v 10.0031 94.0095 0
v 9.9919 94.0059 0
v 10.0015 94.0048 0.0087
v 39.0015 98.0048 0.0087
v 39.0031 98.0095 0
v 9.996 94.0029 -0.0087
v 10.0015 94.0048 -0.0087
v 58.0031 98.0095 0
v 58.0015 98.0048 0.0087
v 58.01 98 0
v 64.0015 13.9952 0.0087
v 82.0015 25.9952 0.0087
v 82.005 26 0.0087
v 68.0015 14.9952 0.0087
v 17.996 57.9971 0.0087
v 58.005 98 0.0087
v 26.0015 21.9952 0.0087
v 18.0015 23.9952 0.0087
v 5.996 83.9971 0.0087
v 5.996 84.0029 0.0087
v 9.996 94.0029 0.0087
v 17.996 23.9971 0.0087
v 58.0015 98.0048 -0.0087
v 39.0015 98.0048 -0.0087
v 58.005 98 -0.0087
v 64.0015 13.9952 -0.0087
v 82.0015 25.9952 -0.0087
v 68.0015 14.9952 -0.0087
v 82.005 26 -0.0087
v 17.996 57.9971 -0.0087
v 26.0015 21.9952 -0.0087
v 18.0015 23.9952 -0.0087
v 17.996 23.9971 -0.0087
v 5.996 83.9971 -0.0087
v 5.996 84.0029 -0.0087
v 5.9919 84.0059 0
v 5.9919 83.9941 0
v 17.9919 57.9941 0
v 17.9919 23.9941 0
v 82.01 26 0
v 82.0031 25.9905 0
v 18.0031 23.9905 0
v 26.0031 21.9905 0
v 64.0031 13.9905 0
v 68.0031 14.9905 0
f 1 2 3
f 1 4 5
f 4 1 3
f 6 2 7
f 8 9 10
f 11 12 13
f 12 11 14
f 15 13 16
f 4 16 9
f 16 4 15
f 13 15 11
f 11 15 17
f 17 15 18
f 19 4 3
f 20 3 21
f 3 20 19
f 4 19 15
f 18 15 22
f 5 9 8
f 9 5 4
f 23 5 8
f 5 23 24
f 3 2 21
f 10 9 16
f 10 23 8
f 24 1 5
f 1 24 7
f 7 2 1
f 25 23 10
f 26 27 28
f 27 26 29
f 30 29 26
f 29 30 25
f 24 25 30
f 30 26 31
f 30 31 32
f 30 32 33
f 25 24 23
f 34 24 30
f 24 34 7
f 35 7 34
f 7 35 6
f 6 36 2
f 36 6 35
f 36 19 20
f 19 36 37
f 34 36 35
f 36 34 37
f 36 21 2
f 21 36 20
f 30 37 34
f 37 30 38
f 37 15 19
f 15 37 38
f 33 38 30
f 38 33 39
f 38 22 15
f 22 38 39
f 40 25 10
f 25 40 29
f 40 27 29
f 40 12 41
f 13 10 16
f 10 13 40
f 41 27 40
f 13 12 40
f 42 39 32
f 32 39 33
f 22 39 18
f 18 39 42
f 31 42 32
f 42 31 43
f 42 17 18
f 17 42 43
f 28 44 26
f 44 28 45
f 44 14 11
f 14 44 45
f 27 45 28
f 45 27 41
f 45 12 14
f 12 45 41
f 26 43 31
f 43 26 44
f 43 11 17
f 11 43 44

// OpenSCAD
color([0.013948469234104865,0.8018456354370093,0.2607079205191076]) hull(){
    translate([10,94]) sphere(0.01);
    translate([39,98]) sphere(0.01);
    translate([58,98]) sphere(0.01);
}
color([0.01899716010339858,0.7507132946374245,0.44168653561511173]) hull(){
    translate([10,94]) sphere(0.01);
    translate([22,90]) sphere(0.01);
    translate([39,98]) sphere(0.01);
}
color([0.1668653701245908,0.45955837321901094,0.7876756969907556]) hull(){
    translate([10,94]) sphere(0.01);
    translate([6,84]) sphere(0.01);
    translate([22,90]) sphere(0.01);
}
color([0.09564527702692727,0.06733136152719421,0.7816649665975636]) hull(){
    translate([22,90]) sphere(0.01);
    translate([6,84]) sphere(0.01);
    translate([18,58]) sphere(0.01);
}
color([0.030385075649315252,0.33346286891595733,0.08647112242809318]) hull(){
    translate([22,90]) sphere(0.01);
    translate([18,58]) sphere(0.01);
    translate([44,55]) sphere(0.01);
}
color([0.8161439782233904,0.05657658467482607,0.8243668117903717]) hull(){
    translate([22,90]) sphere(0.01);
    translate([44,55]) sphere(0.01);
    translate([50,93]) sphere(0.01);
}
color([0.05808931884644186,0.6181904095369413,0.1426995958976538]) hull(){
    translate([22,90]) sphere(0.01);
    translate([50,93]) sphere(0.01);
    translate([39,98]) sphere(0.01);
}
color([0.3846464495954227,0.3794414211645075,0.7643773332264734]) hull(){
    translate([39,98]) sphere(0.01);
    translate([50,93]) sphere(0.01);
    translate([58,98]) sphere(0.01);
}
color([0.3116889002403487,0.7690158776827113,0.7674729074453902]) hull(){
    translate([50,93]) sphere(0.01);
    translate([44,55]) sphere(0.01);
    translate([44,47]) sphere(0.01);
}
color([0.3394448706328078,0.45855440081433096,0.0007502935671159783]) hull(){
    translate([50,93]) sphere(0.01);
    translate([44,47]) sphere(0.01);
    translate([58,33]) sphere(0.01);
}
color([0.8084995756647368,0.0331322283588068,0.9954935019736515]) hull(){
    translate([50,93]) sphere(0.01);
    translate([58,33]) sphere(0.01);
    translate([58,98]) sphere(0.01);
}
color([0.32750610520168044,0.511786711221762,0.09639677946248049]) hull(){
    translate([58,98]) sphere(0.01);
    translate([58,33]) sphere(0.01);
    translate([82,26]) sphere(0.01);
}
color([0.46647601470953737,0.043404226035316795,0.8089506697449751]) hull(){
    translate([44,55]) sphere(0.01);
    translate([18,58]) sphere(0.01);
    translate([18,24]) sphere(0.01);
}
color([0.9065579579370614,0.48874197586323487,0.4689182776921319]) hull(){
    translate([44,55]) sphere(0.01);
    translate([18,24]) sphere(0.01);
    translate([26,22]) sphere(0.01);
}
color([0.9999833648369341,0.42392948264922625,0.11056216143511133]) hull(){
    translate([44,55]) sphere(0.01);
    translate([26,22]) sphere(0.01);
    translate([42,29]) sphere(0.01);
}
color([0.5007484231317689,0.23725843071495933,0.7435751616565288]) hull(){
    translate([44,55]) sphere(0.01);
    translate([42,29]) sphere(0.01);
    translate([44,47]) sphere(0.01);
}
color([0.030326511183225713,0.9534383365251057,0.44454391677925087]) hull(){
    translate([44,47]) sphere(0.01);
    translate([42,29]) sphere(0.01);
    translate([58,33]) sphere(0.01);
}
color([0.4017260225039573,0.6984802625757133,0.14751428227125585]) hull(){
    translate([58,33]) sphere(0.01);
    translate([42,29]) sphere(0.01);
    translate([64,14]) sphere(0.01);
}
color([0.592053202978914,0.7602792343344718,0.23214841748979886]) hull(){
    translate([58,33]) sphere(0.01);
    translate([64,14]) sphere(0.01);
    translate([68,15]) sphere(0.01);
}
color([0.2215781656479593,0.24536616409996503,0.7021925659500807]) hull(){
    translate([58,33]) sphere(0.01);
    translate([68,15]) sphere(0.01);
    translate([82,26]) sphere(0.01);
}
color([0.5457605096294114,0.54011508338913,0.5459453680001618]) hull(){
    translate([42,29]) sphere(0.01);
    translate([26,22]) sphere(0.01);
    translate([64,14]) sphere(0.01);
}
